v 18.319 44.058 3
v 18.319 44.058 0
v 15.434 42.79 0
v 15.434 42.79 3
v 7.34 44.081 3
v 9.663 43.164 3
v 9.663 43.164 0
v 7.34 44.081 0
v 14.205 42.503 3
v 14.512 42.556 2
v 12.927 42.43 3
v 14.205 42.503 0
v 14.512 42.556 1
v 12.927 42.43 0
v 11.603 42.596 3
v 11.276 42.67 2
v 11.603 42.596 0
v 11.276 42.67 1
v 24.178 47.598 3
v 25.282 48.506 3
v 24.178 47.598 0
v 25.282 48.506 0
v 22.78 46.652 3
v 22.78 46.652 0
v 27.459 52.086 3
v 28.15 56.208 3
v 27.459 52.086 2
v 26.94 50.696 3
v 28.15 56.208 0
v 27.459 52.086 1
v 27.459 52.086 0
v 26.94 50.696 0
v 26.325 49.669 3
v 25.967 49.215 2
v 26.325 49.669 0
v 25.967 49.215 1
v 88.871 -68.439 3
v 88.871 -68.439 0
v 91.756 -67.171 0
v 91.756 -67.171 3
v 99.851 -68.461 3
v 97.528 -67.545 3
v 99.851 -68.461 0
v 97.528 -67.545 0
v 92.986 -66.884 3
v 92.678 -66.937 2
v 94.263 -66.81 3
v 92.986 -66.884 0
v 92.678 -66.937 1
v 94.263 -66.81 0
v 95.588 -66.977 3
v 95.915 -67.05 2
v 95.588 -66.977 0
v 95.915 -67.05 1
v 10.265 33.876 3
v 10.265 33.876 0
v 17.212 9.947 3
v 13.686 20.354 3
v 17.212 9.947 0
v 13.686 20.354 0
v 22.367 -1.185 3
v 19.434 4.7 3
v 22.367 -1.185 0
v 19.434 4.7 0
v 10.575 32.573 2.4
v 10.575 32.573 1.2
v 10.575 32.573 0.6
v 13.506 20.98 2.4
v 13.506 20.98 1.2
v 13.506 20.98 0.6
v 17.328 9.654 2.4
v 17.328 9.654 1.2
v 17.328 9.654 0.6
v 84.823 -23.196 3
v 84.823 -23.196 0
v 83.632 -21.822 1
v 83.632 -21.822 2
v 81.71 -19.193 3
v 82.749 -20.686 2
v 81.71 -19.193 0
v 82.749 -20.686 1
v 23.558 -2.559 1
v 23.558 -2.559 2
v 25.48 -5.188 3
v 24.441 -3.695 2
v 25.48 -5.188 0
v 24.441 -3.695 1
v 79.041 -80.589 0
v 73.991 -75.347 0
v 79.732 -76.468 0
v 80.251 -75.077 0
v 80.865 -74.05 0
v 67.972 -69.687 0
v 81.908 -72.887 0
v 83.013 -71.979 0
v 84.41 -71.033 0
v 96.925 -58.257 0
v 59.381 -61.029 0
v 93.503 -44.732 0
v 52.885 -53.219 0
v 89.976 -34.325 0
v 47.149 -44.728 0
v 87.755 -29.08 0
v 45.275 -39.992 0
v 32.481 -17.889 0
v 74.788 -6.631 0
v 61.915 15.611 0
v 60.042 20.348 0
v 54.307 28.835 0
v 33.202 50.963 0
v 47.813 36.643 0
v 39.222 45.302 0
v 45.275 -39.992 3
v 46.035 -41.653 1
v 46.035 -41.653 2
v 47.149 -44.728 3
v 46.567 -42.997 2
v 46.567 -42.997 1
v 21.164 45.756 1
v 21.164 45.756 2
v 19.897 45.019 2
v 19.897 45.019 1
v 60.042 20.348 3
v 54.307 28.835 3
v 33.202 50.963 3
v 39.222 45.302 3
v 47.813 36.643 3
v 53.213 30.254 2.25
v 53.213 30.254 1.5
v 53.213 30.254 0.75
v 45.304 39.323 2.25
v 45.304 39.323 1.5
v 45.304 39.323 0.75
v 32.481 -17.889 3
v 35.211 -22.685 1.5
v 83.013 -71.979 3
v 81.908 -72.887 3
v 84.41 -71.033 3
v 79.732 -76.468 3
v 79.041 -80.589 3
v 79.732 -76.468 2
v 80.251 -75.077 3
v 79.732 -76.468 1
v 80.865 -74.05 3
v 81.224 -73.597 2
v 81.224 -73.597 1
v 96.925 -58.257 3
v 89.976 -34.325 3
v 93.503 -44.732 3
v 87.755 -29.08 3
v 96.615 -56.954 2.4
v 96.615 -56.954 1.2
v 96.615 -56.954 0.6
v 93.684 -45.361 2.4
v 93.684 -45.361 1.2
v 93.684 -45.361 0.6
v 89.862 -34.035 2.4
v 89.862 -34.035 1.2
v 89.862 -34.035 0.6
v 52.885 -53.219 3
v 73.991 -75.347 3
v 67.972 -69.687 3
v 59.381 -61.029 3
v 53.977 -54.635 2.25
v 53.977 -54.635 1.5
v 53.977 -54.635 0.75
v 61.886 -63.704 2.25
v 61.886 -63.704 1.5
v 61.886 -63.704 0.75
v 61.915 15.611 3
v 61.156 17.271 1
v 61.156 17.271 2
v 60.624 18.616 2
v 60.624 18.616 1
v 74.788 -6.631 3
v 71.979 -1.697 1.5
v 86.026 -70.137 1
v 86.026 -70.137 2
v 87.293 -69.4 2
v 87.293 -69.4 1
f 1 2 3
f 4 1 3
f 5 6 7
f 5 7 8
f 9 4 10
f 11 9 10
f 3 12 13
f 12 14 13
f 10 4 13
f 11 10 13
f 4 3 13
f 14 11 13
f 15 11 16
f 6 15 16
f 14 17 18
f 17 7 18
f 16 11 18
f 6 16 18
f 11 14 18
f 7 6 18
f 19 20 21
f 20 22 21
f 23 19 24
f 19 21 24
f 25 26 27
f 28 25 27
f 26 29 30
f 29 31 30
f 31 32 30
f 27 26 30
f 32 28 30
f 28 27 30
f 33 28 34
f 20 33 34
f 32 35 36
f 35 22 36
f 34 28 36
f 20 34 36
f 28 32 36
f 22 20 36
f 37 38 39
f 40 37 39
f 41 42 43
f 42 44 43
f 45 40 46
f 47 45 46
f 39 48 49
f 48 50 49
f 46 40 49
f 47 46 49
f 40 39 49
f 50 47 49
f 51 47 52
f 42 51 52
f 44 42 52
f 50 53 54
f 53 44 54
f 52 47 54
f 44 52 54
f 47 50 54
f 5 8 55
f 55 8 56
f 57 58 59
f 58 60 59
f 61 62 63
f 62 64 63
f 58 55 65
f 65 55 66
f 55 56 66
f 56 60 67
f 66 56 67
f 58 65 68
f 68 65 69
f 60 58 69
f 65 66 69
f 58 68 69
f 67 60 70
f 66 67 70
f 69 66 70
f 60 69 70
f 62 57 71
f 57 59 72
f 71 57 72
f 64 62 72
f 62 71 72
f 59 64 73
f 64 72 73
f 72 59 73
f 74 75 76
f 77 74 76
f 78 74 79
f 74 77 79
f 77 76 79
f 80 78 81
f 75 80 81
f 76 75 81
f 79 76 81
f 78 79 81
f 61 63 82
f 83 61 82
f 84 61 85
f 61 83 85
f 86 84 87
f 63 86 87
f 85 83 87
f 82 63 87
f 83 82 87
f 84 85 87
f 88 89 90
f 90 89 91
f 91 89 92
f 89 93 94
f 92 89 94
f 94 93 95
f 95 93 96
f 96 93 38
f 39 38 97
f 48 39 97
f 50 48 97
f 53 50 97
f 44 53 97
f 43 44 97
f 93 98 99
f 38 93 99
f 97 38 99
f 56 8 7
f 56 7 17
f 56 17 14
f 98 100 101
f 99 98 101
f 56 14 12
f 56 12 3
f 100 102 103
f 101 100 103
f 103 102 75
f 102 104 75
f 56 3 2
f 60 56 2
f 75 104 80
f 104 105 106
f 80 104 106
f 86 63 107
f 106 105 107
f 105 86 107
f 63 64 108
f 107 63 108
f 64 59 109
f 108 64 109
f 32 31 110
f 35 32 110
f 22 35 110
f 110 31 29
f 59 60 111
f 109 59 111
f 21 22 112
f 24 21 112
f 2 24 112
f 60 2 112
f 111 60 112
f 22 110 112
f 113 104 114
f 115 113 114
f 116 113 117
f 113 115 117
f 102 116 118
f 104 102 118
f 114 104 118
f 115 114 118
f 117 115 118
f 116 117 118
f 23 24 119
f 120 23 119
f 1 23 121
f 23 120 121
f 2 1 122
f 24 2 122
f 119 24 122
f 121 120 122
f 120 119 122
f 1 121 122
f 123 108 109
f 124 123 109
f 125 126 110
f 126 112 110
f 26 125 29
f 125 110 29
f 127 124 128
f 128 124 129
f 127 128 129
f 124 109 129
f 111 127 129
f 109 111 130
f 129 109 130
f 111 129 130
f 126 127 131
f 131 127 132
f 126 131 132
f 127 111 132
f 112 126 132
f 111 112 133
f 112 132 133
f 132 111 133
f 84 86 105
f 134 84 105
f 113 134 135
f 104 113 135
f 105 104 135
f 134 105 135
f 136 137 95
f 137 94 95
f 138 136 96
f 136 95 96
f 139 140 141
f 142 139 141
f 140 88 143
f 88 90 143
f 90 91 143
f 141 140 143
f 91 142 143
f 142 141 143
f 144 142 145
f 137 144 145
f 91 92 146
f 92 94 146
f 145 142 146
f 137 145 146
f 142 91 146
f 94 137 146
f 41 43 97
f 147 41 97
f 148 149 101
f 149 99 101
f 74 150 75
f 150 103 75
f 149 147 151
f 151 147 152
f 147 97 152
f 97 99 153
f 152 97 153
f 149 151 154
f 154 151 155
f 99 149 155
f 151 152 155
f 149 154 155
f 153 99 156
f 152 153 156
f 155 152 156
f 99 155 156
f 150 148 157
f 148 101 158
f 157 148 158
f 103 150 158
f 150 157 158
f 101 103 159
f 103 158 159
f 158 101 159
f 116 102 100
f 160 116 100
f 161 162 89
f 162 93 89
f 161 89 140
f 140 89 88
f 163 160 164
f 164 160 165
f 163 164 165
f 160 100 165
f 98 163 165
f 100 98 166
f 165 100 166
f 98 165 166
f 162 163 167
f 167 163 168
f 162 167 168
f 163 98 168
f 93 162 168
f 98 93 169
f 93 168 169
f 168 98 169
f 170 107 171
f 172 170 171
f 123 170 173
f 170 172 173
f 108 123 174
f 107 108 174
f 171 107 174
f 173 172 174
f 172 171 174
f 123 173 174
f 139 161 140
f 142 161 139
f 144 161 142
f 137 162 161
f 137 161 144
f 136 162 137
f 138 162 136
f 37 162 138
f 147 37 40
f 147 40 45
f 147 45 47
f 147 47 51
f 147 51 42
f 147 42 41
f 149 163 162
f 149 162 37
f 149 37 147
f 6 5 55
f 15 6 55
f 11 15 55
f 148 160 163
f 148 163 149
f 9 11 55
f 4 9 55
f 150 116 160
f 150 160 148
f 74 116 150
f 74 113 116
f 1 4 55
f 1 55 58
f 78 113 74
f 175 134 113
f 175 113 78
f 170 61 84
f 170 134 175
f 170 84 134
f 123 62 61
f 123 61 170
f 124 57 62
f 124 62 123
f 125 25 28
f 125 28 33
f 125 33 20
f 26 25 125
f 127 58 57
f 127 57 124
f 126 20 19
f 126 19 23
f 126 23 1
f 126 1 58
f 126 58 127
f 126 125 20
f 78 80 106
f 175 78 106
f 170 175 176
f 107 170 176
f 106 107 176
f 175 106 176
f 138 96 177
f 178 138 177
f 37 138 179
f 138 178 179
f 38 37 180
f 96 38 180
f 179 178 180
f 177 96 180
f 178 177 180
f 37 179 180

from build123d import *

# Parameters (mm, degrees)
EXTRUDE_1_DEPTH = 3


with BuildPart() as part:
    # Model → Бобышка-Вытянуть1 (new body)
    with BuildSketch(Plane.XY):
        with BuildLine():
            add(Edge.make_bspline(
                [(28.149610918, 56.207860507), (27.560922081, 51.146890819), (27.112546506, 49.376041298), (22.779757926, 46.651828213)],
                knots=[0, 0, 0, 0, 1, 1, 1, 1], degree=3))
            add(Edge.make_bspline(
                [(22.779757926, 46.651828213), (20.768921561, 45.547558815), (20.273287738, 45.259325354), (18.319069439, 44.05769969)],
                knots=[0, 0, 0, 0, 1, 1, 1, 1], degree=3))
            add(Edge.make_bspline(
                [(18.319069439, 44.05769969), (13.803279303, 41.641988188), (12.048597233, 42.126790249), (7.33961788, 44.080726925)],
                knots=[0, 0, 0, 0, 1, 1, 1, 1], degree=3))
            add(Edge.make_bspline(
                [(7.33961788, 44.080726925), (8.149699278, 41.549642577), (8.621529102, 40.179387064), (9.628519532, 36.569244705), (10.275261882, 33.842755264), (11.17343166, 30.034855536), (12.386200485, 24.898053213), (14.625548303, 17.062650929), (15.816783113, 13.461801988), (18.839691943, 5.845364354), (19.908248831, 3.52685101), (22.36744727, -1.185213105)],
                knots=[0, 0, 0, 0, 0.125, 0.125, 0.25, 0.25, 0.5, 0.5, 0.75, 0.75, 1, 1, 1, 1], degree=3))
            add(Edge.make_bspline(
                [(22.36744727, -1.185213105), (23.864896129, -2.87516102), (24.210365999, -3.320130257), (25.479686226, -5.187547479)],
                knots=[0, 0, 0, 0, 1, 1, 1, 1], degree=3))
            add(Edge.make_bspline(
                [(25.479686226, -5.187547479), (29.668288598, -13.038710968), (31.727341764, -16.552093911), (38.694819033, -28.817050656), (40.654400173, -32.387347919), (45.275114793, -39.992234686)],
                knots=[0, 0, 0, 0, 0.5, 0.5, 1, 1, 1, 1], degree=3))
            add(Edge.make_bspline(
                [(45.275114793, -39.992234686), (46.241533848, -42.044233729), (46.450109134, -42.570291399), (47.148538289, -44.728240061)],
                knots=[0, 0, 0, 0, 1, 1, 1, 1], degree=3))
            add(Edge.make_bspline(
                [(47.148538289, -44.728240061), (49.973426614, -49.272405433), (51.482586935, -51.440933032), (56.470710005, -57.829999853), (59.164176218, -60.879346353), (64.608626983, -66.529344664), (66.642517284, -68.464119623), (74.42569361, -75.69131071), (75.386253078, -76.68142814), (79.041318652, -80.589024236)],
                knots=[0, 0, 0, 0, 0.25, 0.25, 0.5, 0.5, 0.75, 0.75, 1, 1, 1, 1], degree=3))
            add(Edge.make_bspline(
                [(79.041318652, -80.589024236), (79.629599945, -75.528227661), (80.077839438, -73.757405674), (84.410276024, -71.033059032)],
                knots=[0, 0, 0, 0, 1, 1, 1, 1], degree=3))
            add(Edge.make_bspline(
                [(84.410276024, -71.033059032), (86.421198824, -69.928740939), (86.91688577, -69.640544451), (88.871337213, -68.43909049)],
                knots=[0, 0, 0, 0, 1, 1, 1, 1], degree=3))
            add(Edge.make_bspline(
                [(88.871337213, -68.43909049), (93.386975511, -66.022642512), (95.141867274, -66.507429453), (99.851301684, -68.460878088)],
                knots=[0, 0, 0, 0, 1, 1, 1, 1], degree=3))
            add(Edge.make_bspline(
                [(99.851301684, -68.460878088), (99.040925268, -65.929940052), (98.568960988, -64.559806075), (97.561674354, -60.949723571), (96.916130588, -58.2289141), (96.013894102, -54.404458492), (94.803674048, -49.278915964), (92.564269255, -41.443620041), (91.373036556, -37.842869648), (88.350151427, -30.226605543), (87.281558663, -27.908155461), (84.822527009, -23.196115705)],
                knots=[0, 0, 0, 0, 0.125, 0.125, 0.25, 0.25, 0.5, 0.5, 0.75, 0.75, 1, 1, 1, 1], degree=3))
            add(Edge.make_bspline(
                [(84.822527009, -23.196115705), (83.325122862, -21.506034699), (82.979667426, -21.061032084), (81.710402424, -19.193487861)],
                knots=[0, 0, 0, 0, 1, 1, 1, 1], degree=3))
            add(Edge.make_bspline(
                [(81.710402424, -19.193487861), (77.522252219, -11.342279926), (75.588524574, -8.050461965), (68.369510384, 4.656701124), (66.533556444, 8.004368796), (61.915420371, 15.610629705)],
                knots=[0, 0, 0, 0, 0.5, 0.5, 1, 1, 1, 1], degree=3))
            add(Edge.make_bspline(
                [(61.915420371, 15.610629705), (60.949423407, 17.663222472), (60.740864542, 18.189405403), (60.042133095, 20.347645644)],
                knots=[0, 0, 0, 0, 1, 1, 1, 1], degree=3))
            add(Edge.make_bspline(
                [(60.042133095, 20.347645644), (57.216954414, 24.891531729), (55.707611925, 27.059818341), (50.719279832, 33.448684897), (48.025845314, 36.497947024), (42.581538922, 42.147819434), (40.545819203, 44.084319784), (32.766687748, 51.308192561), (31.804324389, 52.300050246), (28.149610918, 56.207860507)],
                knots=[0, 0, 0, 0, 0.25, 0.25, 0.5, 0.5, 0.75, 0.75, 1, 1, 1, 1], degree=3))
        make_face()
    extrude(amount=EXTRUDE_1_DEPTH)


solid = part.part
